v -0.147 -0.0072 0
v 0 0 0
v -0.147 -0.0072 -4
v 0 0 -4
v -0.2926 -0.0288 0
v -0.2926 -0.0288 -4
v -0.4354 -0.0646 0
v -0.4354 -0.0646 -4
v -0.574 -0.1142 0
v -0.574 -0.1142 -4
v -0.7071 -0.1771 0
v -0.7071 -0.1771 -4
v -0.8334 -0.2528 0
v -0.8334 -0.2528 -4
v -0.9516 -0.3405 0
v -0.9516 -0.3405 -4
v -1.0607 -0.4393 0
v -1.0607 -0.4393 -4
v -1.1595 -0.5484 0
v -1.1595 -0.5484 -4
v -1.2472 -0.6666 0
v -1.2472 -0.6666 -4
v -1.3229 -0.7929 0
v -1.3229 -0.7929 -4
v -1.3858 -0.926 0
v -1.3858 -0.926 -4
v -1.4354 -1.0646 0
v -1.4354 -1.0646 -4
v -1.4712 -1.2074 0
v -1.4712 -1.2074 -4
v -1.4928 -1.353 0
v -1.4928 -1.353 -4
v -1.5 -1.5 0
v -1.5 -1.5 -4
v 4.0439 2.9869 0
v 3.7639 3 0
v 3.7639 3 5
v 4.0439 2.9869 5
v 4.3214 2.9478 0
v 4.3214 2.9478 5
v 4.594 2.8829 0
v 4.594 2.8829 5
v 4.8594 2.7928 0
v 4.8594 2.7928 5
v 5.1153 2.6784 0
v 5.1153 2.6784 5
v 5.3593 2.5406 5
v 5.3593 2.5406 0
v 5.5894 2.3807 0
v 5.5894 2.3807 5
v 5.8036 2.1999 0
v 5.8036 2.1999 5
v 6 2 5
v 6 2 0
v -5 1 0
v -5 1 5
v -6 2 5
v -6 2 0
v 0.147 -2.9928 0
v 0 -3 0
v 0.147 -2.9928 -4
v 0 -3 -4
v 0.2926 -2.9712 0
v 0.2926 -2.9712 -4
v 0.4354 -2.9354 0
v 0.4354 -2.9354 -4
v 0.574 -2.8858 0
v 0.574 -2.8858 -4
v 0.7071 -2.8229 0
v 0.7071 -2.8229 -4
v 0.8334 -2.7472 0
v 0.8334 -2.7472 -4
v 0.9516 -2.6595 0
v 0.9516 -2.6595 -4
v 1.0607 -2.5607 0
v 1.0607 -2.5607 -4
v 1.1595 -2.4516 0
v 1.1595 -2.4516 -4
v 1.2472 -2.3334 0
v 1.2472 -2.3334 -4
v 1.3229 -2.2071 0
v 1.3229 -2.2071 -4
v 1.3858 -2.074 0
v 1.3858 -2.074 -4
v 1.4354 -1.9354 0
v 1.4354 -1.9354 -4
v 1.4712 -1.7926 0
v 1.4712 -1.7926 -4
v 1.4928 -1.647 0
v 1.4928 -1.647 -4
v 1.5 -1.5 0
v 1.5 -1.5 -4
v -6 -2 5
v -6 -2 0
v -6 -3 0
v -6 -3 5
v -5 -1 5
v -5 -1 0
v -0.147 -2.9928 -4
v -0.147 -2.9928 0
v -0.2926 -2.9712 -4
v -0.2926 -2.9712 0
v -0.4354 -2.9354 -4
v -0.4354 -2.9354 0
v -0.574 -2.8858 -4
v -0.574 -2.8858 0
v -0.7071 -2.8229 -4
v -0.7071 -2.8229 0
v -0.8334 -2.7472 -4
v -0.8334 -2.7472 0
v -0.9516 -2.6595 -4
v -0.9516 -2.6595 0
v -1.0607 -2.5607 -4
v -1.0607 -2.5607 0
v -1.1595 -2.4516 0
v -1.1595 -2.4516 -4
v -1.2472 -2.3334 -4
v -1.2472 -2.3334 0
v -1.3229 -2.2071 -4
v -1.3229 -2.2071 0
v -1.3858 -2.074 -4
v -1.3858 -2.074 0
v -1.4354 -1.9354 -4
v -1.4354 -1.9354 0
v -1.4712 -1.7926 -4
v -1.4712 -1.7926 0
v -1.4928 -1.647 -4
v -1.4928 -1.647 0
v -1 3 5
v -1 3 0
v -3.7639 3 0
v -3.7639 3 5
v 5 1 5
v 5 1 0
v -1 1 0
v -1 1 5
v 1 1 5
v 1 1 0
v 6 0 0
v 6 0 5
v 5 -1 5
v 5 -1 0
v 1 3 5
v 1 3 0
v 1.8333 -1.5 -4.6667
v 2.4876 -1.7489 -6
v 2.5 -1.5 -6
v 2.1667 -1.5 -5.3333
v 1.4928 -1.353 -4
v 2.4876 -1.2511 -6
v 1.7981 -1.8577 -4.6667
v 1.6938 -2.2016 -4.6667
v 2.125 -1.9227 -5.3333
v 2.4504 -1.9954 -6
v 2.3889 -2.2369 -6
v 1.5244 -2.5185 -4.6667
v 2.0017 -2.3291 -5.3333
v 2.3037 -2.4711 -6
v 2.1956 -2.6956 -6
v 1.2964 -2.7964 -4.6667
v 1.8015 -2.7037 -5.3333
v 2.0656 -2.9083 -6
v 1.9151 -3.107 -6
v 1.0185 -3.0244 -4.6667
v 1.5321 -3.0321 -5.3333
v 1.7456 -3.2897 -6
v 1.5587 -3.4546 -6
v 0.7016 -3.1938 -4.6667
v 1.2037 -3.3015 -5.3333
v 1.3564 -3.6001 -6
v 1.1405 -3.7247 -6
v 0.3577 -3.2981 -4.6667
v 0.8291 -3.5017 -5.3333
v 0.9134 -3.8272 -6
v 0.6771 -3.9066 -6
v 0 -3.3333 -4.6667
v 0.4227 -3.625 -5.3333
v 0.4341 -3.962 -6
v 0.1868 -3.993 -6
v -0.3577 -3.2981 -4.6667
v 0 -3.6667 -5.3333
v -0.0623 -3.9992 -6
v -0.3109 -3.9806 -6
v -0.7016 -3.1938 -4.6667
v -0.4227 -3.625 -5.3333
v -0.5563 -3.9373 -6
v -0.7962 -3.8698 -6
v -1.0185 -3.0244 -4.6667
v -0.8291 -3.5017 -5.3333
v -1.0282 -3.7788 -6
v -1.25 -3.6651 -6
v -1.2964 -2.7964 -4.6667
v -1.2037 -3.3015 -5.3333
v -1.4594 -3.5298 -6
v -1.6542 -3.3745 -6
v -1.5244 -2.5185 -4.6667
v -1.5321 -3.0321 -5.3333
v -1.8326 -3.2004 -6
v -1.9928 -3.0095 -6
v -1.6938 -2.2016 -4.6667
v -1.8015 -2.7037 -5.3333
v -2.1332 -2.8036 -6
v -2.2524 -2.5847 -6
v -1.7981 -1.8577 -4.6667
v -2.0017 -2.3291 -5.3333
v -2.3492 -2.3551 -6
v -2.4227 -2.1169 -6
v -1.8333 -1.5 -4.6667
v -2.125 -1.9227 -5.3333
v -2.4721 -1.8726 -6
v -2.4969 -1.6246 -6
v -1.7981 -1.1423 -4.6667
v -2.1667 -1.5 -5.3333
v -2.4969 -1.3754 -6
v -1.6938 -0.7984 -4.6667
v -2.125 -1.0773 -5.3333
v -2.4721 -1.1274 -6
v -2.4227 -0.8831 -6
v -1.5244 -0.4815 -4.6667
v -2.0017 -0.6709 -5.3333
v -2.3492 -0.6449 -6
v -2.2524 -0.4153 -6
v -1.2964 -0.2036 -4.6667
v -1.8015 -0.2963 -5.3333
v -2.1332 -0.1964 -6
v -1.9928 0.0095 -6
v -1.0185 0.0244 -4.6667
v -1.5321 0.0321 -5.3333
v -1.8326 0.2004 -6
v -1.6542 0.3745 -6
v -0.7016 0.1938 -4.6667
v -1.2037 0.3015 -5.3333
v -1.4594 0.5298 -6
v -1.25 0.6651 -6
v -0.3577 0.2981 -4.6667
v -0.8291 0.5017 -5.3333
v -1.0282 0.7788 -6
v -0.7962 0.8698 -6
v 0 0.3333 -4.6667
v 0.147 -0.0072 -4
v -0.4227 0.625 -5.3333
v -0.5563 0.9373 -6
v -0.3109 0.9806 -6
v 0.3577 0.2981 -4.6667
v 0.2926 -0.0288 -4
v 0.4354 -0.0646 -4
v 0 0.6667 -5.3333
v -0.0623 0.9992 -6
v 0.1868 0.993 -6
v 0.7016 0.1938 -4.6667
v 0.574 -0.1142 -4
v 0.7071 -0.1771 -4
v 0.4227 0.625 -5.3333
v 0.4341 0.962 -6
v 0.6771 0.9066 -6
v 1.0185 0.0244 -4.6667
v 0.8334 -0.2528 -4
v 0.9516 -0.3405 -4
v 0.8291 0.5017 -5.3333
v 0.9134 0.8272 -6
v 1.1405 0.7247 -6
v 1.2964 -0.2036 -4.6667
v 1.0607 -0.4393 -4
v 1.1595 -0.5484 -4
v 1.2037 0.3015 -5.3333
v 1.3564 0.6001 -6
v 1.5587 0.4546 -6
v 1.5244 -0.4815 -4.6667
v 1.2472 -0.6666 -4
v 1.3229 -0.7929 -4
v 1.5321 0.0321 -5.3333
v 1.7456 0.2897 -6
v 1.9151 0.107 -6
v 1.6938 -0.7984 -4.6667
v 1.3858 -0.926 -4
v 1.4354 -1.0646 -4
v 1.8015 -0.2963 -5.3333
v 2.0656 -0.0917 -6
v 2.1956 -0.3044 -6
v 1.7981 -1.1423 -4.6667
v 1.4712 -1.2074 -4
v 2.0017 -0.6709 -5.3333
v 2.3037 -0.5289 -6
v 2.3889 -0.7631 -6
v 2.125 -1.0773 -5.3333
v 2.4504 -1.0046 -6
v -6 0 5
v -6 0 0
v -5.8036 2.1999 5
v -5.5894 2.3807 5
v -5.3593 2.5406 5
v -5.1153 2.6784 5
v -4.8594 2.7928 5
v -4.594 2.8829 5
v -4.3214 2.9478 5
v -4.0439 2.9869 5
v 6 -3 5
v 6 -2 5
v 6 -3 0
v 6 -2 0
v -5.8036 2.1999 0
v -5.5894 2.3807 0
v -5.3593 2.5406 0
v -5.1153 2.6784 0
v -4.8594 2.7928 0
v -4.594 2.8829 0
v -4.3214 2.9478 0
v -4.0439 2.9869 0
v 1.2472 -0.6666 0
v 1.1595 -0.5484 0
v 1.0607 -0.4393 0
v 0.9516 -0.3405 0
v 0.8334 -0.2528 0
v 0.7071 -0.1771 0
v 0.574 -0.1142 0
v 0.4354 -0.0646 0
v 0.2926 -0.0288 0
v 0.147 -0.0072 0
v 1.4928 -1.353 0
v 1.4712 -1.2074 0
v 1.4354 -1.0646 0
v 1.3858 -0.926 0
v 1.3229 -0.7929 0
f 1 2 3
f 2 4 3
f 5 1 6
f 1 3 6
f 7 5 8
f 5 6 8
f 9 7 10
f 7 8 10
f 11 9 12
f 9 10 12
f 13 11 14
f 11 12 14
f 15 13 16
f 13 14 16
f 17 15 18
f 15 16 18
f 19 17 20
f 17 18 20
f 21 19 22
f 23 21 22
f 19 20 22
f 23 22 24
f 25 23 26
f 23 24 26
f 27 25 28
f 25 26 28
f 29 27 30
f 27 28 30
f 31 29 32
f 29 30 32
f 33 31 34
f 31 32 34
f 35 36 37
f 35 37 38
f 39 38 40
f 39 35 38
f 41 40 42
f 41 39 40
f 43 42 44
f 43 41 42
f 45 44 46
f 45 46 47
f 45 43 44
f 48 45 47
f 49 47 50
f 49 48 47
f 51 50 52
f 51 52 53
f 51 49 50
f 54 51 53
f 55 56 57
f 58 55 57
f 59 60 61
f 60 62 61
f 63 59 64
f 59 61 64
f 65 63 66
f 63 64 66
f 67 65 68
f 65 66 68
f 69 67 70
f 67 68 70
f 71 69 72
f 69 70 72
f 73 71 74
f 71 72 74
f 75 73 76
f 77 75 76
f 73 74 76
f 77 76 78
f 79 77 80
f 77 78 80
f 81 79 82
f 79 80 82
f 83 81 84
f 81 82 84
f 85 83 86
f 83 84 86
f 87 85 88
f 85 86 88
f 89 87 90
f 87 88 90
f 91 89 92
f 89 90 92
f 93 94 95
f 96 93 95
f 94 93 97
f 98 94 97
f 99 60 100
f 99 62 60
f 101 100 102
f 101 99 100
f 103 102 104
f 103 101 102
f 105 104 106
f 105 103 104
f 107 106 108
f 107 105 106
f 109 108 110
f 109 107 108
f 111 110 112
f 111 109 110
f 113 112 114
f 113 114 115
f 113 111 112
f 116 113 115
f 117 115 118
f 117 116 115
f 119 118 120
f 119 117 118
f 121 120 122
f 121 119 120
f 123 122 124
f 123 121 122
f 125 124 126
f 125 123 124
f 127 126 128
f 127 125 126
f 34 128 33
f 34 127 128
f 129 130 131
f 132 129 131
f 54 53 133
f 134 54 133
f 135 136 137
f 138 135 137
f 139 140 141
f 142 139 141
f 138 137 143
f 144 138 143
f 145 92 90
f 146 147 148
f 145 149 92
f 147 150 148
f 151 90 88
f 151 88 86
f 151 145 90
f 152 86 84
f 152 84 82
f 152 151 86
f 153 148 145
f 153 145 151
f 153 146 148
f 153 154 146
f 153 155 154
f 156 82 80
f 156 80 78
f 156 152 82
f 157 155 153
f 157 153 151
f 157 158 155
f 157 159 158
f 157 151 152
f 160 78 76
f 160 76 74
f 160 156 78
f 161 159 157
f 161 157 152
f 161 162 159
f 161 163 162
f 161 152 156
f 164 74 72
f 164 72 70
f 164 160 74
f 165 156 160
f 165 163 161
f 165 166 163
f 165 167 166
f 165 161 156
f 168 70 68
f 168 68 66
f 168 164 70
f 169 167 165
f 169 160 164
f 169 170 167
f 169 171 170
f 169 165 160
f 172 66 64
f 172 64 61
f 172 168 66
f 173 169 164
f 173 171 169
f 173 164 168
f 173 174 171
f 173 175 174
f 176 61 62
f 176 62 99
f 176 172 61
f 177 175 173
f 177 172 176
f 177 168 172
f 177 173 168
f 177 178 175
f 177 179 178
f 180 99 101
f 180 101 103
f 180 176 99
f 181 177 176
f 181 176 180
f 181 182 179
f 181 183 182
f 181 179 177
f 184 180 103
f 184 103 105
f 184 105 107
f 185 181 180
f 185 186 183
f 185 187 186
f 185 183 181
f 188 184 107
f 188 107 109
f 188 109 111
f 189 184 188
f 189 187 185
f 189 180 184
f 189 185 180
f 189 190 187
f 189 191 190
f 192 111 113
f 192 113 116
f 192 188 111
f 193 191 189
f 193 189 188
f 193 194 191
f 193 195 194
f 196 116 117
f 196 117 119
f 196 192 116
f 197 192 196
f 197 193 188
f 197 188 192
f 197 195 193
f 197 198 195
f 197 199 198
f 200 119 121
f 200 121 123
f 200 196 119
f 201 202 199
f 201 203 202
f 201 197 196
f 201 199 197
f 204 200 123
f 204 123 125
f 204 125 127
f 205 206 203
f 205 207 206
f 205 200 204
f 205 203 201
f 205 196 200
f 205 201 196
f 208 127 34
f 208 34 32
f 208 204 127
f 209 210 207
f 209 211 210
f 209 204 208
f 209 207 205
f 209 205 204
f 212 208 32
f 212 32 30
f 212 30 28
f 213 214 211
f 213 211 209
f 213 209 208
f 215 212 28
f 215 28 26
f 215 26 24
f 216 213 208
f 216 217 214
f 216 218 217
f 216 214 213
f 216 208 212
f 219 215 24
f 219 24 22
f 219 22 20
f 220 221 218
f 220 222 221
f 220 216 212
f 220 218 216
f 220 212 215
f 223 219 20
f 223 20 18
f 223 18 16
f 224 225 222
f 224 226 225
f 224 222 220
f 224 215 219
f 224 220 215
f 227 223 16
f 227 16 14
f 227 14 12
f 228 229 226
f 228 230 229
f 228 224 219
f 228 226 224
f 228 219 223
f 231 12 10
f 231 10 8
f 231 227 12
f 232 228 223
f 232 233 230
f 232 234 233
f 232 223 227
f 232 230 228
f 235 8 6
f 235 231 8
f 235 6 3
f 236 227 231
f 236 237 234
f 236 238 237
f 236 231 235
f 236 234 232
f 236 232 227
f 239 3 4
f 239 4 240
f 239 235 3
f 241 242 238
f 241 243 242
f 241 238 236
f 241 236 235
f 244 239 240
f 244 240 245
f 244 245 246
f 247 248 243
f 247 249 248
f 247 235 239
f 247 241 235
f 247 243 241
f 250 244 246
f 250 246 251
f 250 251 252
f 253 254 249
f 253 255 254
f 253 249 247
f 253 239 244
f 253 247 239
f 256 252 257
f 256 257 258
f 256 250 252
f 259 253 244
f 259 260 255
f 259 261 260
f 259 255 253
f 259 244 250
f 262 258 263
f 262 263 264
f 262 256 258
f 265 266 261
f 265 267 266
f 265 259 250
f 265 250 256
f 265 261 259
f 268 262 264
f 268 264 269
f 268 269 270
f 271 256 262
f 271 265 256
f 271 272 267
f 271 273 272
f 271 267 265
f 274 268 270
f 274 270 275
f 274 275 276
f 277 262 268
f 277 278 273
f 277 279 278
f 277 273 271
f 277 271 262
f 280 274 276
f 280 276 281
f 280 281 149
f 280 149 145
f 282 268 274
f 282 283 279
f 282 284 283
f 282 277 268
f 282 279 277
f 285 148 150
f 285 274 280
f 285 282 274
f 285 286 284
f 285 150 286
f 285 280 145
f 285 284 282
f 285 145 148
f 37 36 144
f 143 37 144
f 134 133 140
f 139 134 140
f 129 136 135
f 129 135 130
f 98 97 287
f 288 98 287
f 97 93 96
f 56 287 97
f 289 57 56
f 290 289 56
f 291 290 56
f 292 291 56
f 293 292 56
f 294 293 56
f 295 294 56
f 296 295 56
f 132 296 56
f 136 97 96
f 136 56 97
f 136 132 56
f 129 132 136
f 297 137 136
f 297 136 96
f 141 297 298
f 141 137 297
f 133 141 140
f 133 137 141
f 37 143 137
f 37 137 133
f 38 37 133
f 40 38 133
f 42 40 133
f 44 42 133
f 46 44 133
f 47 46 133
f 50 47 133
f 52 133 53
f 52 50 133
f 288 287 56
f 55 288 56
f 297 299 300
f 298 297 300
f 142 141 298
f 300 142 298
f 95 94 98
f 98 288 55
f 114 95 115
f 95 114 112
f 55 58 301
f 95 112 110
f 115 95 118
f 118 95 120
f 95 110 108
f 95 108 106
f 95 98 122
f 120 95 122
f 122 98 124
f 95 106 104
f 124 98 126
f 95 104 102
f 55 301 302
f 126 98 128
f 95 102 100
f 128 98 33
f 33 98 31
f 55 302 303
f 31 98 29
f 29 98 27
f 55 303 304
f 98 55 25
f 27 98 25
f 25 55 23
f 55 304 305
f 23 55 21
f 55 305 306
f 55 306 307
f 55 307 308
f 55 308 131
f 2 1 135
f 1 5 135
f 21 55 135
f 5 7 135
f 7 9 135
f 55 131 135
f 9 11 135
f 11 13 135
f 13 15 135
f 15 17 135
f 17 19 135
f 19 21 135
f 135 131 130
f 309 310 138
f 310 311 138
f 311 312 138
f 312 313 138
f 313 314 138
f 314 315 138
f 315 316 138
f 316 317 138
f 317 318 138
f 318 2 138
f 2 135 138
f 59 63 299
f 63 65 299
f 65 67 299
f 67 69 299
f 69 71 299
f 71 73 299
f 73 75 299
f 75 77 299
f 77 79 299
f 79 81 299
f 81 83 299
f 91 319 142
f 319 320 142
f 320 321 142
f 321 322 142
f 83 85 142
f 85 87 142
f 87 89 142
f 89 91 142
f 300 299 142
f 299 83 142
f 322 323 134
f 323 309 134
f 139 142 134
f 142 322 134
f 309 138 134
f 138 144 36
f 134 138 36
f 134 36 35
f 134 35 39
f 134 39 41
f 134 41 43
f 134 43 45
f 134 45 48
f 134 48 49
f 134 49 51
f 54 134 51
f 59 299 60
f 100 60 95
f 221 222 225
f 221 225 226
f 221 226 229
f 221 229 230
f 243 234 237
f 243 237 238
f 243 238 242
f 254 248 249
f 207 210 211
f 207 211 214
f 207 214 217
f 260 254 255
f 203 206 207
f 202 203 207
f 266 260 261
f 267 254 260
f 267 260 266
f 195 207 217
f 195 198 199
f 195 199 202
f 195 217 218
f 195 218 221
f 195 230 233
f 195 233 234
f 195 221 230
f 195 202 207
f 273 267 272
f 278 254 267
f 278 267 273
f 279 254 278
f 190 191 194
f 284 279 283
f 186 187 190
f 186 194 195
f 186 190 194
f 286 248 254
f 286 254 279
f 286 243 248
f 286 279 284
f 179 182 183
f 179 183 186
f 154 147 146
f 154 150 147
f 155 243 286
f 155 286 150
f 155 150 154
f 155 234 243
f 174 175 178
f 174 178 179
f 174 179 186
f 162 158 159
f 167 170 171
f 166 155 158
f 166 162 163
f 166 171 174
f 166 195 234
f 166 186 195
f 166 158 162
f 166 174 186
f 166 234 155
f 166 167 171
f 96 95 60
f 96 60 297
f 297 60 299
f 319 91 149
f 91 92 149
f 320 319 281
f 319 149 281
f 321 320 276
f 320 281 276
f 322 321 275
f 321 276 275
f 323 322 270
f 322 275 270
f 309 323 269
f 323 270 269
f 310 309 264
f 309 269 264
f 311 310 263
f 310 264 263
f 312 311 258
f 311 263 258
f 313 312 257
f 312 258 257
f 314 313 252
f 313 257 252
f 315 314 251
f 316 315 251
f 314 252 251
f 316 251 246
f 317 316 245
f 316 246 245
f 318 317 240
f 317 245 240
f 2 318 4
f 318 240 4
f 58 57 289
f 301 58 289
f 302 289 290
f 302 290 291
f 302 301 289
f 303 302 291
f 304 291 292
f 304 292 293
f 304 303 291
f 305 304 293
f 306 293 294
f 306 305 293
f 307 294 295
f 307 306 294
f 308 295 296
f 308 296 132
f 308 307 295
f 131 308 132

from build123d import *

# Parameters (mm, degrees)
F0_W        = 2
F0_H        = 2
F1_DEPTH    = 5
F2_W        = 3
F2_H        = 3
F3_DEPTH    = 4
F4_R        = 1.49999
F5_W        = 2
F5_H        = 2
F6_DEPTH    = 5
F8_DEPTH    = 9.001
F9_T1_DEPTH = 16.1803398875
F10_R       = 1.5
F12_R       = 2.5


# Not quite as in the source:
# - a fillet or chamfer that OpenCascade refuses, or shapes differently, is made with other operations: its cross-section is extruded or revolved along the edge and cut away or added
# - a fillet or chamfer is up to 0.001 mm smaller than in the source, because OpenCascade refuses the exact size


with BuildPart() as f1:
    # F0 (on Top) → F1 (new body)
    with BuildSketch(Plane.XY):
        Polygon((-6, -3), (6, -3), (6, 3), (1, 3), (1, 1), (-1, 1), (-1, 3), (-6, 3), align=None)
        with Locations((0, 2)):
            Rectangle(F0_W, F0_H)
    extrude(amount=F1_DEPTH)

    # F2 (on face) → F3 (join)
    with BuildSketch(Plane(origin=(0, 0, 0), x_dir=(1, 0, 0), z_dir=(0, 0, -1))):
        with Locations((0, 1.5)):
            Rectangle(F2_W, F2_H)
    extrude(amount=F3_DEPTH)

    # F4 (radius 1.5 in the source; OpenCascade refuses exactly that, so slightly less here)
    f4_edges = [f1.edges().sort_by_distance(p)[0] for p in [
        (-1.5, 0, -2),
        (1.5, 0, -2),
        (-1.5, -3, -2),
        (1.5, -3, -2),
    ]]
    fillet(f4_edges, radius=F4_R)

    # F5 (on face) → F6 (cut, through all)
    with BuildSketch(Plane.XY.offset(5)):
        with Locations((0, 2)):
            Rectangle(F5_W, F5_H)
    extrude(amount=-F6_DEPTH, mode=Mode.SUBTRACT)

    # F7 (on face) → F8 (cut, through all)
    with BuildSketch(Plane.XY.offset(5)):
        Polygon((-5, 1), (-6, 2), (-6, 0), align=None)
        Polygon((-5, -1), (-6, 0), (-6, -2), align=None)
        Polygon((6, -2), (6, 0), (5, -1), align=None)
        Polygon((6, 0), (6, 2), (5, 1), align=None)
    extrude(amount=-F8_DEPTH, mode=Mode.SUBTRACT)

    # F9: fillet of radius 3 on 2 edges, made by hand

    # F9_s2 → F9_t1 (cut)
    with BuildSketch(Plane.XY.offset(-5.5901699437)):
        with BuildLine():
            ThreePointArc((-6, 2), (-4.9886768939, 2.7386127875), (-3.7639320225, 3))
            Line((-3.7639320225, 3), (-6, 3))
            Line((-6, 3), (-6, 2))
        make_face()
        with BuildLine():
            ThreePointArc((3.7639320225, 3), (4.9886768939, 2.7386127875), (6, 2))
            Line((6, 2), (6, 3))
            Line((6, 3), (3.7639320225, 3))
        make_face()
    extrude(amount=F9_T1_DEPTH, mode=Mode.SUBTRACT)

    # F10 (on face) → F13 section 0
    with BuildSketch(Plane(origin=(0, 0, -4), x_dir=(1, 0, 0), z_dir=(0, 0, -1))):
        with Locations((0, 1.5)):
            Circle(F10_R)
    # F12 (on offset) → F13 section 1
    with BuildSketch(Plane(origin=(0, 0, -6), x_dir=(1, 0, 0), z_dir=(0, 0, -1))):
        with Locations((0, 1.5)):
            Circle(F12_R)
    loft()


solid = f1.part
